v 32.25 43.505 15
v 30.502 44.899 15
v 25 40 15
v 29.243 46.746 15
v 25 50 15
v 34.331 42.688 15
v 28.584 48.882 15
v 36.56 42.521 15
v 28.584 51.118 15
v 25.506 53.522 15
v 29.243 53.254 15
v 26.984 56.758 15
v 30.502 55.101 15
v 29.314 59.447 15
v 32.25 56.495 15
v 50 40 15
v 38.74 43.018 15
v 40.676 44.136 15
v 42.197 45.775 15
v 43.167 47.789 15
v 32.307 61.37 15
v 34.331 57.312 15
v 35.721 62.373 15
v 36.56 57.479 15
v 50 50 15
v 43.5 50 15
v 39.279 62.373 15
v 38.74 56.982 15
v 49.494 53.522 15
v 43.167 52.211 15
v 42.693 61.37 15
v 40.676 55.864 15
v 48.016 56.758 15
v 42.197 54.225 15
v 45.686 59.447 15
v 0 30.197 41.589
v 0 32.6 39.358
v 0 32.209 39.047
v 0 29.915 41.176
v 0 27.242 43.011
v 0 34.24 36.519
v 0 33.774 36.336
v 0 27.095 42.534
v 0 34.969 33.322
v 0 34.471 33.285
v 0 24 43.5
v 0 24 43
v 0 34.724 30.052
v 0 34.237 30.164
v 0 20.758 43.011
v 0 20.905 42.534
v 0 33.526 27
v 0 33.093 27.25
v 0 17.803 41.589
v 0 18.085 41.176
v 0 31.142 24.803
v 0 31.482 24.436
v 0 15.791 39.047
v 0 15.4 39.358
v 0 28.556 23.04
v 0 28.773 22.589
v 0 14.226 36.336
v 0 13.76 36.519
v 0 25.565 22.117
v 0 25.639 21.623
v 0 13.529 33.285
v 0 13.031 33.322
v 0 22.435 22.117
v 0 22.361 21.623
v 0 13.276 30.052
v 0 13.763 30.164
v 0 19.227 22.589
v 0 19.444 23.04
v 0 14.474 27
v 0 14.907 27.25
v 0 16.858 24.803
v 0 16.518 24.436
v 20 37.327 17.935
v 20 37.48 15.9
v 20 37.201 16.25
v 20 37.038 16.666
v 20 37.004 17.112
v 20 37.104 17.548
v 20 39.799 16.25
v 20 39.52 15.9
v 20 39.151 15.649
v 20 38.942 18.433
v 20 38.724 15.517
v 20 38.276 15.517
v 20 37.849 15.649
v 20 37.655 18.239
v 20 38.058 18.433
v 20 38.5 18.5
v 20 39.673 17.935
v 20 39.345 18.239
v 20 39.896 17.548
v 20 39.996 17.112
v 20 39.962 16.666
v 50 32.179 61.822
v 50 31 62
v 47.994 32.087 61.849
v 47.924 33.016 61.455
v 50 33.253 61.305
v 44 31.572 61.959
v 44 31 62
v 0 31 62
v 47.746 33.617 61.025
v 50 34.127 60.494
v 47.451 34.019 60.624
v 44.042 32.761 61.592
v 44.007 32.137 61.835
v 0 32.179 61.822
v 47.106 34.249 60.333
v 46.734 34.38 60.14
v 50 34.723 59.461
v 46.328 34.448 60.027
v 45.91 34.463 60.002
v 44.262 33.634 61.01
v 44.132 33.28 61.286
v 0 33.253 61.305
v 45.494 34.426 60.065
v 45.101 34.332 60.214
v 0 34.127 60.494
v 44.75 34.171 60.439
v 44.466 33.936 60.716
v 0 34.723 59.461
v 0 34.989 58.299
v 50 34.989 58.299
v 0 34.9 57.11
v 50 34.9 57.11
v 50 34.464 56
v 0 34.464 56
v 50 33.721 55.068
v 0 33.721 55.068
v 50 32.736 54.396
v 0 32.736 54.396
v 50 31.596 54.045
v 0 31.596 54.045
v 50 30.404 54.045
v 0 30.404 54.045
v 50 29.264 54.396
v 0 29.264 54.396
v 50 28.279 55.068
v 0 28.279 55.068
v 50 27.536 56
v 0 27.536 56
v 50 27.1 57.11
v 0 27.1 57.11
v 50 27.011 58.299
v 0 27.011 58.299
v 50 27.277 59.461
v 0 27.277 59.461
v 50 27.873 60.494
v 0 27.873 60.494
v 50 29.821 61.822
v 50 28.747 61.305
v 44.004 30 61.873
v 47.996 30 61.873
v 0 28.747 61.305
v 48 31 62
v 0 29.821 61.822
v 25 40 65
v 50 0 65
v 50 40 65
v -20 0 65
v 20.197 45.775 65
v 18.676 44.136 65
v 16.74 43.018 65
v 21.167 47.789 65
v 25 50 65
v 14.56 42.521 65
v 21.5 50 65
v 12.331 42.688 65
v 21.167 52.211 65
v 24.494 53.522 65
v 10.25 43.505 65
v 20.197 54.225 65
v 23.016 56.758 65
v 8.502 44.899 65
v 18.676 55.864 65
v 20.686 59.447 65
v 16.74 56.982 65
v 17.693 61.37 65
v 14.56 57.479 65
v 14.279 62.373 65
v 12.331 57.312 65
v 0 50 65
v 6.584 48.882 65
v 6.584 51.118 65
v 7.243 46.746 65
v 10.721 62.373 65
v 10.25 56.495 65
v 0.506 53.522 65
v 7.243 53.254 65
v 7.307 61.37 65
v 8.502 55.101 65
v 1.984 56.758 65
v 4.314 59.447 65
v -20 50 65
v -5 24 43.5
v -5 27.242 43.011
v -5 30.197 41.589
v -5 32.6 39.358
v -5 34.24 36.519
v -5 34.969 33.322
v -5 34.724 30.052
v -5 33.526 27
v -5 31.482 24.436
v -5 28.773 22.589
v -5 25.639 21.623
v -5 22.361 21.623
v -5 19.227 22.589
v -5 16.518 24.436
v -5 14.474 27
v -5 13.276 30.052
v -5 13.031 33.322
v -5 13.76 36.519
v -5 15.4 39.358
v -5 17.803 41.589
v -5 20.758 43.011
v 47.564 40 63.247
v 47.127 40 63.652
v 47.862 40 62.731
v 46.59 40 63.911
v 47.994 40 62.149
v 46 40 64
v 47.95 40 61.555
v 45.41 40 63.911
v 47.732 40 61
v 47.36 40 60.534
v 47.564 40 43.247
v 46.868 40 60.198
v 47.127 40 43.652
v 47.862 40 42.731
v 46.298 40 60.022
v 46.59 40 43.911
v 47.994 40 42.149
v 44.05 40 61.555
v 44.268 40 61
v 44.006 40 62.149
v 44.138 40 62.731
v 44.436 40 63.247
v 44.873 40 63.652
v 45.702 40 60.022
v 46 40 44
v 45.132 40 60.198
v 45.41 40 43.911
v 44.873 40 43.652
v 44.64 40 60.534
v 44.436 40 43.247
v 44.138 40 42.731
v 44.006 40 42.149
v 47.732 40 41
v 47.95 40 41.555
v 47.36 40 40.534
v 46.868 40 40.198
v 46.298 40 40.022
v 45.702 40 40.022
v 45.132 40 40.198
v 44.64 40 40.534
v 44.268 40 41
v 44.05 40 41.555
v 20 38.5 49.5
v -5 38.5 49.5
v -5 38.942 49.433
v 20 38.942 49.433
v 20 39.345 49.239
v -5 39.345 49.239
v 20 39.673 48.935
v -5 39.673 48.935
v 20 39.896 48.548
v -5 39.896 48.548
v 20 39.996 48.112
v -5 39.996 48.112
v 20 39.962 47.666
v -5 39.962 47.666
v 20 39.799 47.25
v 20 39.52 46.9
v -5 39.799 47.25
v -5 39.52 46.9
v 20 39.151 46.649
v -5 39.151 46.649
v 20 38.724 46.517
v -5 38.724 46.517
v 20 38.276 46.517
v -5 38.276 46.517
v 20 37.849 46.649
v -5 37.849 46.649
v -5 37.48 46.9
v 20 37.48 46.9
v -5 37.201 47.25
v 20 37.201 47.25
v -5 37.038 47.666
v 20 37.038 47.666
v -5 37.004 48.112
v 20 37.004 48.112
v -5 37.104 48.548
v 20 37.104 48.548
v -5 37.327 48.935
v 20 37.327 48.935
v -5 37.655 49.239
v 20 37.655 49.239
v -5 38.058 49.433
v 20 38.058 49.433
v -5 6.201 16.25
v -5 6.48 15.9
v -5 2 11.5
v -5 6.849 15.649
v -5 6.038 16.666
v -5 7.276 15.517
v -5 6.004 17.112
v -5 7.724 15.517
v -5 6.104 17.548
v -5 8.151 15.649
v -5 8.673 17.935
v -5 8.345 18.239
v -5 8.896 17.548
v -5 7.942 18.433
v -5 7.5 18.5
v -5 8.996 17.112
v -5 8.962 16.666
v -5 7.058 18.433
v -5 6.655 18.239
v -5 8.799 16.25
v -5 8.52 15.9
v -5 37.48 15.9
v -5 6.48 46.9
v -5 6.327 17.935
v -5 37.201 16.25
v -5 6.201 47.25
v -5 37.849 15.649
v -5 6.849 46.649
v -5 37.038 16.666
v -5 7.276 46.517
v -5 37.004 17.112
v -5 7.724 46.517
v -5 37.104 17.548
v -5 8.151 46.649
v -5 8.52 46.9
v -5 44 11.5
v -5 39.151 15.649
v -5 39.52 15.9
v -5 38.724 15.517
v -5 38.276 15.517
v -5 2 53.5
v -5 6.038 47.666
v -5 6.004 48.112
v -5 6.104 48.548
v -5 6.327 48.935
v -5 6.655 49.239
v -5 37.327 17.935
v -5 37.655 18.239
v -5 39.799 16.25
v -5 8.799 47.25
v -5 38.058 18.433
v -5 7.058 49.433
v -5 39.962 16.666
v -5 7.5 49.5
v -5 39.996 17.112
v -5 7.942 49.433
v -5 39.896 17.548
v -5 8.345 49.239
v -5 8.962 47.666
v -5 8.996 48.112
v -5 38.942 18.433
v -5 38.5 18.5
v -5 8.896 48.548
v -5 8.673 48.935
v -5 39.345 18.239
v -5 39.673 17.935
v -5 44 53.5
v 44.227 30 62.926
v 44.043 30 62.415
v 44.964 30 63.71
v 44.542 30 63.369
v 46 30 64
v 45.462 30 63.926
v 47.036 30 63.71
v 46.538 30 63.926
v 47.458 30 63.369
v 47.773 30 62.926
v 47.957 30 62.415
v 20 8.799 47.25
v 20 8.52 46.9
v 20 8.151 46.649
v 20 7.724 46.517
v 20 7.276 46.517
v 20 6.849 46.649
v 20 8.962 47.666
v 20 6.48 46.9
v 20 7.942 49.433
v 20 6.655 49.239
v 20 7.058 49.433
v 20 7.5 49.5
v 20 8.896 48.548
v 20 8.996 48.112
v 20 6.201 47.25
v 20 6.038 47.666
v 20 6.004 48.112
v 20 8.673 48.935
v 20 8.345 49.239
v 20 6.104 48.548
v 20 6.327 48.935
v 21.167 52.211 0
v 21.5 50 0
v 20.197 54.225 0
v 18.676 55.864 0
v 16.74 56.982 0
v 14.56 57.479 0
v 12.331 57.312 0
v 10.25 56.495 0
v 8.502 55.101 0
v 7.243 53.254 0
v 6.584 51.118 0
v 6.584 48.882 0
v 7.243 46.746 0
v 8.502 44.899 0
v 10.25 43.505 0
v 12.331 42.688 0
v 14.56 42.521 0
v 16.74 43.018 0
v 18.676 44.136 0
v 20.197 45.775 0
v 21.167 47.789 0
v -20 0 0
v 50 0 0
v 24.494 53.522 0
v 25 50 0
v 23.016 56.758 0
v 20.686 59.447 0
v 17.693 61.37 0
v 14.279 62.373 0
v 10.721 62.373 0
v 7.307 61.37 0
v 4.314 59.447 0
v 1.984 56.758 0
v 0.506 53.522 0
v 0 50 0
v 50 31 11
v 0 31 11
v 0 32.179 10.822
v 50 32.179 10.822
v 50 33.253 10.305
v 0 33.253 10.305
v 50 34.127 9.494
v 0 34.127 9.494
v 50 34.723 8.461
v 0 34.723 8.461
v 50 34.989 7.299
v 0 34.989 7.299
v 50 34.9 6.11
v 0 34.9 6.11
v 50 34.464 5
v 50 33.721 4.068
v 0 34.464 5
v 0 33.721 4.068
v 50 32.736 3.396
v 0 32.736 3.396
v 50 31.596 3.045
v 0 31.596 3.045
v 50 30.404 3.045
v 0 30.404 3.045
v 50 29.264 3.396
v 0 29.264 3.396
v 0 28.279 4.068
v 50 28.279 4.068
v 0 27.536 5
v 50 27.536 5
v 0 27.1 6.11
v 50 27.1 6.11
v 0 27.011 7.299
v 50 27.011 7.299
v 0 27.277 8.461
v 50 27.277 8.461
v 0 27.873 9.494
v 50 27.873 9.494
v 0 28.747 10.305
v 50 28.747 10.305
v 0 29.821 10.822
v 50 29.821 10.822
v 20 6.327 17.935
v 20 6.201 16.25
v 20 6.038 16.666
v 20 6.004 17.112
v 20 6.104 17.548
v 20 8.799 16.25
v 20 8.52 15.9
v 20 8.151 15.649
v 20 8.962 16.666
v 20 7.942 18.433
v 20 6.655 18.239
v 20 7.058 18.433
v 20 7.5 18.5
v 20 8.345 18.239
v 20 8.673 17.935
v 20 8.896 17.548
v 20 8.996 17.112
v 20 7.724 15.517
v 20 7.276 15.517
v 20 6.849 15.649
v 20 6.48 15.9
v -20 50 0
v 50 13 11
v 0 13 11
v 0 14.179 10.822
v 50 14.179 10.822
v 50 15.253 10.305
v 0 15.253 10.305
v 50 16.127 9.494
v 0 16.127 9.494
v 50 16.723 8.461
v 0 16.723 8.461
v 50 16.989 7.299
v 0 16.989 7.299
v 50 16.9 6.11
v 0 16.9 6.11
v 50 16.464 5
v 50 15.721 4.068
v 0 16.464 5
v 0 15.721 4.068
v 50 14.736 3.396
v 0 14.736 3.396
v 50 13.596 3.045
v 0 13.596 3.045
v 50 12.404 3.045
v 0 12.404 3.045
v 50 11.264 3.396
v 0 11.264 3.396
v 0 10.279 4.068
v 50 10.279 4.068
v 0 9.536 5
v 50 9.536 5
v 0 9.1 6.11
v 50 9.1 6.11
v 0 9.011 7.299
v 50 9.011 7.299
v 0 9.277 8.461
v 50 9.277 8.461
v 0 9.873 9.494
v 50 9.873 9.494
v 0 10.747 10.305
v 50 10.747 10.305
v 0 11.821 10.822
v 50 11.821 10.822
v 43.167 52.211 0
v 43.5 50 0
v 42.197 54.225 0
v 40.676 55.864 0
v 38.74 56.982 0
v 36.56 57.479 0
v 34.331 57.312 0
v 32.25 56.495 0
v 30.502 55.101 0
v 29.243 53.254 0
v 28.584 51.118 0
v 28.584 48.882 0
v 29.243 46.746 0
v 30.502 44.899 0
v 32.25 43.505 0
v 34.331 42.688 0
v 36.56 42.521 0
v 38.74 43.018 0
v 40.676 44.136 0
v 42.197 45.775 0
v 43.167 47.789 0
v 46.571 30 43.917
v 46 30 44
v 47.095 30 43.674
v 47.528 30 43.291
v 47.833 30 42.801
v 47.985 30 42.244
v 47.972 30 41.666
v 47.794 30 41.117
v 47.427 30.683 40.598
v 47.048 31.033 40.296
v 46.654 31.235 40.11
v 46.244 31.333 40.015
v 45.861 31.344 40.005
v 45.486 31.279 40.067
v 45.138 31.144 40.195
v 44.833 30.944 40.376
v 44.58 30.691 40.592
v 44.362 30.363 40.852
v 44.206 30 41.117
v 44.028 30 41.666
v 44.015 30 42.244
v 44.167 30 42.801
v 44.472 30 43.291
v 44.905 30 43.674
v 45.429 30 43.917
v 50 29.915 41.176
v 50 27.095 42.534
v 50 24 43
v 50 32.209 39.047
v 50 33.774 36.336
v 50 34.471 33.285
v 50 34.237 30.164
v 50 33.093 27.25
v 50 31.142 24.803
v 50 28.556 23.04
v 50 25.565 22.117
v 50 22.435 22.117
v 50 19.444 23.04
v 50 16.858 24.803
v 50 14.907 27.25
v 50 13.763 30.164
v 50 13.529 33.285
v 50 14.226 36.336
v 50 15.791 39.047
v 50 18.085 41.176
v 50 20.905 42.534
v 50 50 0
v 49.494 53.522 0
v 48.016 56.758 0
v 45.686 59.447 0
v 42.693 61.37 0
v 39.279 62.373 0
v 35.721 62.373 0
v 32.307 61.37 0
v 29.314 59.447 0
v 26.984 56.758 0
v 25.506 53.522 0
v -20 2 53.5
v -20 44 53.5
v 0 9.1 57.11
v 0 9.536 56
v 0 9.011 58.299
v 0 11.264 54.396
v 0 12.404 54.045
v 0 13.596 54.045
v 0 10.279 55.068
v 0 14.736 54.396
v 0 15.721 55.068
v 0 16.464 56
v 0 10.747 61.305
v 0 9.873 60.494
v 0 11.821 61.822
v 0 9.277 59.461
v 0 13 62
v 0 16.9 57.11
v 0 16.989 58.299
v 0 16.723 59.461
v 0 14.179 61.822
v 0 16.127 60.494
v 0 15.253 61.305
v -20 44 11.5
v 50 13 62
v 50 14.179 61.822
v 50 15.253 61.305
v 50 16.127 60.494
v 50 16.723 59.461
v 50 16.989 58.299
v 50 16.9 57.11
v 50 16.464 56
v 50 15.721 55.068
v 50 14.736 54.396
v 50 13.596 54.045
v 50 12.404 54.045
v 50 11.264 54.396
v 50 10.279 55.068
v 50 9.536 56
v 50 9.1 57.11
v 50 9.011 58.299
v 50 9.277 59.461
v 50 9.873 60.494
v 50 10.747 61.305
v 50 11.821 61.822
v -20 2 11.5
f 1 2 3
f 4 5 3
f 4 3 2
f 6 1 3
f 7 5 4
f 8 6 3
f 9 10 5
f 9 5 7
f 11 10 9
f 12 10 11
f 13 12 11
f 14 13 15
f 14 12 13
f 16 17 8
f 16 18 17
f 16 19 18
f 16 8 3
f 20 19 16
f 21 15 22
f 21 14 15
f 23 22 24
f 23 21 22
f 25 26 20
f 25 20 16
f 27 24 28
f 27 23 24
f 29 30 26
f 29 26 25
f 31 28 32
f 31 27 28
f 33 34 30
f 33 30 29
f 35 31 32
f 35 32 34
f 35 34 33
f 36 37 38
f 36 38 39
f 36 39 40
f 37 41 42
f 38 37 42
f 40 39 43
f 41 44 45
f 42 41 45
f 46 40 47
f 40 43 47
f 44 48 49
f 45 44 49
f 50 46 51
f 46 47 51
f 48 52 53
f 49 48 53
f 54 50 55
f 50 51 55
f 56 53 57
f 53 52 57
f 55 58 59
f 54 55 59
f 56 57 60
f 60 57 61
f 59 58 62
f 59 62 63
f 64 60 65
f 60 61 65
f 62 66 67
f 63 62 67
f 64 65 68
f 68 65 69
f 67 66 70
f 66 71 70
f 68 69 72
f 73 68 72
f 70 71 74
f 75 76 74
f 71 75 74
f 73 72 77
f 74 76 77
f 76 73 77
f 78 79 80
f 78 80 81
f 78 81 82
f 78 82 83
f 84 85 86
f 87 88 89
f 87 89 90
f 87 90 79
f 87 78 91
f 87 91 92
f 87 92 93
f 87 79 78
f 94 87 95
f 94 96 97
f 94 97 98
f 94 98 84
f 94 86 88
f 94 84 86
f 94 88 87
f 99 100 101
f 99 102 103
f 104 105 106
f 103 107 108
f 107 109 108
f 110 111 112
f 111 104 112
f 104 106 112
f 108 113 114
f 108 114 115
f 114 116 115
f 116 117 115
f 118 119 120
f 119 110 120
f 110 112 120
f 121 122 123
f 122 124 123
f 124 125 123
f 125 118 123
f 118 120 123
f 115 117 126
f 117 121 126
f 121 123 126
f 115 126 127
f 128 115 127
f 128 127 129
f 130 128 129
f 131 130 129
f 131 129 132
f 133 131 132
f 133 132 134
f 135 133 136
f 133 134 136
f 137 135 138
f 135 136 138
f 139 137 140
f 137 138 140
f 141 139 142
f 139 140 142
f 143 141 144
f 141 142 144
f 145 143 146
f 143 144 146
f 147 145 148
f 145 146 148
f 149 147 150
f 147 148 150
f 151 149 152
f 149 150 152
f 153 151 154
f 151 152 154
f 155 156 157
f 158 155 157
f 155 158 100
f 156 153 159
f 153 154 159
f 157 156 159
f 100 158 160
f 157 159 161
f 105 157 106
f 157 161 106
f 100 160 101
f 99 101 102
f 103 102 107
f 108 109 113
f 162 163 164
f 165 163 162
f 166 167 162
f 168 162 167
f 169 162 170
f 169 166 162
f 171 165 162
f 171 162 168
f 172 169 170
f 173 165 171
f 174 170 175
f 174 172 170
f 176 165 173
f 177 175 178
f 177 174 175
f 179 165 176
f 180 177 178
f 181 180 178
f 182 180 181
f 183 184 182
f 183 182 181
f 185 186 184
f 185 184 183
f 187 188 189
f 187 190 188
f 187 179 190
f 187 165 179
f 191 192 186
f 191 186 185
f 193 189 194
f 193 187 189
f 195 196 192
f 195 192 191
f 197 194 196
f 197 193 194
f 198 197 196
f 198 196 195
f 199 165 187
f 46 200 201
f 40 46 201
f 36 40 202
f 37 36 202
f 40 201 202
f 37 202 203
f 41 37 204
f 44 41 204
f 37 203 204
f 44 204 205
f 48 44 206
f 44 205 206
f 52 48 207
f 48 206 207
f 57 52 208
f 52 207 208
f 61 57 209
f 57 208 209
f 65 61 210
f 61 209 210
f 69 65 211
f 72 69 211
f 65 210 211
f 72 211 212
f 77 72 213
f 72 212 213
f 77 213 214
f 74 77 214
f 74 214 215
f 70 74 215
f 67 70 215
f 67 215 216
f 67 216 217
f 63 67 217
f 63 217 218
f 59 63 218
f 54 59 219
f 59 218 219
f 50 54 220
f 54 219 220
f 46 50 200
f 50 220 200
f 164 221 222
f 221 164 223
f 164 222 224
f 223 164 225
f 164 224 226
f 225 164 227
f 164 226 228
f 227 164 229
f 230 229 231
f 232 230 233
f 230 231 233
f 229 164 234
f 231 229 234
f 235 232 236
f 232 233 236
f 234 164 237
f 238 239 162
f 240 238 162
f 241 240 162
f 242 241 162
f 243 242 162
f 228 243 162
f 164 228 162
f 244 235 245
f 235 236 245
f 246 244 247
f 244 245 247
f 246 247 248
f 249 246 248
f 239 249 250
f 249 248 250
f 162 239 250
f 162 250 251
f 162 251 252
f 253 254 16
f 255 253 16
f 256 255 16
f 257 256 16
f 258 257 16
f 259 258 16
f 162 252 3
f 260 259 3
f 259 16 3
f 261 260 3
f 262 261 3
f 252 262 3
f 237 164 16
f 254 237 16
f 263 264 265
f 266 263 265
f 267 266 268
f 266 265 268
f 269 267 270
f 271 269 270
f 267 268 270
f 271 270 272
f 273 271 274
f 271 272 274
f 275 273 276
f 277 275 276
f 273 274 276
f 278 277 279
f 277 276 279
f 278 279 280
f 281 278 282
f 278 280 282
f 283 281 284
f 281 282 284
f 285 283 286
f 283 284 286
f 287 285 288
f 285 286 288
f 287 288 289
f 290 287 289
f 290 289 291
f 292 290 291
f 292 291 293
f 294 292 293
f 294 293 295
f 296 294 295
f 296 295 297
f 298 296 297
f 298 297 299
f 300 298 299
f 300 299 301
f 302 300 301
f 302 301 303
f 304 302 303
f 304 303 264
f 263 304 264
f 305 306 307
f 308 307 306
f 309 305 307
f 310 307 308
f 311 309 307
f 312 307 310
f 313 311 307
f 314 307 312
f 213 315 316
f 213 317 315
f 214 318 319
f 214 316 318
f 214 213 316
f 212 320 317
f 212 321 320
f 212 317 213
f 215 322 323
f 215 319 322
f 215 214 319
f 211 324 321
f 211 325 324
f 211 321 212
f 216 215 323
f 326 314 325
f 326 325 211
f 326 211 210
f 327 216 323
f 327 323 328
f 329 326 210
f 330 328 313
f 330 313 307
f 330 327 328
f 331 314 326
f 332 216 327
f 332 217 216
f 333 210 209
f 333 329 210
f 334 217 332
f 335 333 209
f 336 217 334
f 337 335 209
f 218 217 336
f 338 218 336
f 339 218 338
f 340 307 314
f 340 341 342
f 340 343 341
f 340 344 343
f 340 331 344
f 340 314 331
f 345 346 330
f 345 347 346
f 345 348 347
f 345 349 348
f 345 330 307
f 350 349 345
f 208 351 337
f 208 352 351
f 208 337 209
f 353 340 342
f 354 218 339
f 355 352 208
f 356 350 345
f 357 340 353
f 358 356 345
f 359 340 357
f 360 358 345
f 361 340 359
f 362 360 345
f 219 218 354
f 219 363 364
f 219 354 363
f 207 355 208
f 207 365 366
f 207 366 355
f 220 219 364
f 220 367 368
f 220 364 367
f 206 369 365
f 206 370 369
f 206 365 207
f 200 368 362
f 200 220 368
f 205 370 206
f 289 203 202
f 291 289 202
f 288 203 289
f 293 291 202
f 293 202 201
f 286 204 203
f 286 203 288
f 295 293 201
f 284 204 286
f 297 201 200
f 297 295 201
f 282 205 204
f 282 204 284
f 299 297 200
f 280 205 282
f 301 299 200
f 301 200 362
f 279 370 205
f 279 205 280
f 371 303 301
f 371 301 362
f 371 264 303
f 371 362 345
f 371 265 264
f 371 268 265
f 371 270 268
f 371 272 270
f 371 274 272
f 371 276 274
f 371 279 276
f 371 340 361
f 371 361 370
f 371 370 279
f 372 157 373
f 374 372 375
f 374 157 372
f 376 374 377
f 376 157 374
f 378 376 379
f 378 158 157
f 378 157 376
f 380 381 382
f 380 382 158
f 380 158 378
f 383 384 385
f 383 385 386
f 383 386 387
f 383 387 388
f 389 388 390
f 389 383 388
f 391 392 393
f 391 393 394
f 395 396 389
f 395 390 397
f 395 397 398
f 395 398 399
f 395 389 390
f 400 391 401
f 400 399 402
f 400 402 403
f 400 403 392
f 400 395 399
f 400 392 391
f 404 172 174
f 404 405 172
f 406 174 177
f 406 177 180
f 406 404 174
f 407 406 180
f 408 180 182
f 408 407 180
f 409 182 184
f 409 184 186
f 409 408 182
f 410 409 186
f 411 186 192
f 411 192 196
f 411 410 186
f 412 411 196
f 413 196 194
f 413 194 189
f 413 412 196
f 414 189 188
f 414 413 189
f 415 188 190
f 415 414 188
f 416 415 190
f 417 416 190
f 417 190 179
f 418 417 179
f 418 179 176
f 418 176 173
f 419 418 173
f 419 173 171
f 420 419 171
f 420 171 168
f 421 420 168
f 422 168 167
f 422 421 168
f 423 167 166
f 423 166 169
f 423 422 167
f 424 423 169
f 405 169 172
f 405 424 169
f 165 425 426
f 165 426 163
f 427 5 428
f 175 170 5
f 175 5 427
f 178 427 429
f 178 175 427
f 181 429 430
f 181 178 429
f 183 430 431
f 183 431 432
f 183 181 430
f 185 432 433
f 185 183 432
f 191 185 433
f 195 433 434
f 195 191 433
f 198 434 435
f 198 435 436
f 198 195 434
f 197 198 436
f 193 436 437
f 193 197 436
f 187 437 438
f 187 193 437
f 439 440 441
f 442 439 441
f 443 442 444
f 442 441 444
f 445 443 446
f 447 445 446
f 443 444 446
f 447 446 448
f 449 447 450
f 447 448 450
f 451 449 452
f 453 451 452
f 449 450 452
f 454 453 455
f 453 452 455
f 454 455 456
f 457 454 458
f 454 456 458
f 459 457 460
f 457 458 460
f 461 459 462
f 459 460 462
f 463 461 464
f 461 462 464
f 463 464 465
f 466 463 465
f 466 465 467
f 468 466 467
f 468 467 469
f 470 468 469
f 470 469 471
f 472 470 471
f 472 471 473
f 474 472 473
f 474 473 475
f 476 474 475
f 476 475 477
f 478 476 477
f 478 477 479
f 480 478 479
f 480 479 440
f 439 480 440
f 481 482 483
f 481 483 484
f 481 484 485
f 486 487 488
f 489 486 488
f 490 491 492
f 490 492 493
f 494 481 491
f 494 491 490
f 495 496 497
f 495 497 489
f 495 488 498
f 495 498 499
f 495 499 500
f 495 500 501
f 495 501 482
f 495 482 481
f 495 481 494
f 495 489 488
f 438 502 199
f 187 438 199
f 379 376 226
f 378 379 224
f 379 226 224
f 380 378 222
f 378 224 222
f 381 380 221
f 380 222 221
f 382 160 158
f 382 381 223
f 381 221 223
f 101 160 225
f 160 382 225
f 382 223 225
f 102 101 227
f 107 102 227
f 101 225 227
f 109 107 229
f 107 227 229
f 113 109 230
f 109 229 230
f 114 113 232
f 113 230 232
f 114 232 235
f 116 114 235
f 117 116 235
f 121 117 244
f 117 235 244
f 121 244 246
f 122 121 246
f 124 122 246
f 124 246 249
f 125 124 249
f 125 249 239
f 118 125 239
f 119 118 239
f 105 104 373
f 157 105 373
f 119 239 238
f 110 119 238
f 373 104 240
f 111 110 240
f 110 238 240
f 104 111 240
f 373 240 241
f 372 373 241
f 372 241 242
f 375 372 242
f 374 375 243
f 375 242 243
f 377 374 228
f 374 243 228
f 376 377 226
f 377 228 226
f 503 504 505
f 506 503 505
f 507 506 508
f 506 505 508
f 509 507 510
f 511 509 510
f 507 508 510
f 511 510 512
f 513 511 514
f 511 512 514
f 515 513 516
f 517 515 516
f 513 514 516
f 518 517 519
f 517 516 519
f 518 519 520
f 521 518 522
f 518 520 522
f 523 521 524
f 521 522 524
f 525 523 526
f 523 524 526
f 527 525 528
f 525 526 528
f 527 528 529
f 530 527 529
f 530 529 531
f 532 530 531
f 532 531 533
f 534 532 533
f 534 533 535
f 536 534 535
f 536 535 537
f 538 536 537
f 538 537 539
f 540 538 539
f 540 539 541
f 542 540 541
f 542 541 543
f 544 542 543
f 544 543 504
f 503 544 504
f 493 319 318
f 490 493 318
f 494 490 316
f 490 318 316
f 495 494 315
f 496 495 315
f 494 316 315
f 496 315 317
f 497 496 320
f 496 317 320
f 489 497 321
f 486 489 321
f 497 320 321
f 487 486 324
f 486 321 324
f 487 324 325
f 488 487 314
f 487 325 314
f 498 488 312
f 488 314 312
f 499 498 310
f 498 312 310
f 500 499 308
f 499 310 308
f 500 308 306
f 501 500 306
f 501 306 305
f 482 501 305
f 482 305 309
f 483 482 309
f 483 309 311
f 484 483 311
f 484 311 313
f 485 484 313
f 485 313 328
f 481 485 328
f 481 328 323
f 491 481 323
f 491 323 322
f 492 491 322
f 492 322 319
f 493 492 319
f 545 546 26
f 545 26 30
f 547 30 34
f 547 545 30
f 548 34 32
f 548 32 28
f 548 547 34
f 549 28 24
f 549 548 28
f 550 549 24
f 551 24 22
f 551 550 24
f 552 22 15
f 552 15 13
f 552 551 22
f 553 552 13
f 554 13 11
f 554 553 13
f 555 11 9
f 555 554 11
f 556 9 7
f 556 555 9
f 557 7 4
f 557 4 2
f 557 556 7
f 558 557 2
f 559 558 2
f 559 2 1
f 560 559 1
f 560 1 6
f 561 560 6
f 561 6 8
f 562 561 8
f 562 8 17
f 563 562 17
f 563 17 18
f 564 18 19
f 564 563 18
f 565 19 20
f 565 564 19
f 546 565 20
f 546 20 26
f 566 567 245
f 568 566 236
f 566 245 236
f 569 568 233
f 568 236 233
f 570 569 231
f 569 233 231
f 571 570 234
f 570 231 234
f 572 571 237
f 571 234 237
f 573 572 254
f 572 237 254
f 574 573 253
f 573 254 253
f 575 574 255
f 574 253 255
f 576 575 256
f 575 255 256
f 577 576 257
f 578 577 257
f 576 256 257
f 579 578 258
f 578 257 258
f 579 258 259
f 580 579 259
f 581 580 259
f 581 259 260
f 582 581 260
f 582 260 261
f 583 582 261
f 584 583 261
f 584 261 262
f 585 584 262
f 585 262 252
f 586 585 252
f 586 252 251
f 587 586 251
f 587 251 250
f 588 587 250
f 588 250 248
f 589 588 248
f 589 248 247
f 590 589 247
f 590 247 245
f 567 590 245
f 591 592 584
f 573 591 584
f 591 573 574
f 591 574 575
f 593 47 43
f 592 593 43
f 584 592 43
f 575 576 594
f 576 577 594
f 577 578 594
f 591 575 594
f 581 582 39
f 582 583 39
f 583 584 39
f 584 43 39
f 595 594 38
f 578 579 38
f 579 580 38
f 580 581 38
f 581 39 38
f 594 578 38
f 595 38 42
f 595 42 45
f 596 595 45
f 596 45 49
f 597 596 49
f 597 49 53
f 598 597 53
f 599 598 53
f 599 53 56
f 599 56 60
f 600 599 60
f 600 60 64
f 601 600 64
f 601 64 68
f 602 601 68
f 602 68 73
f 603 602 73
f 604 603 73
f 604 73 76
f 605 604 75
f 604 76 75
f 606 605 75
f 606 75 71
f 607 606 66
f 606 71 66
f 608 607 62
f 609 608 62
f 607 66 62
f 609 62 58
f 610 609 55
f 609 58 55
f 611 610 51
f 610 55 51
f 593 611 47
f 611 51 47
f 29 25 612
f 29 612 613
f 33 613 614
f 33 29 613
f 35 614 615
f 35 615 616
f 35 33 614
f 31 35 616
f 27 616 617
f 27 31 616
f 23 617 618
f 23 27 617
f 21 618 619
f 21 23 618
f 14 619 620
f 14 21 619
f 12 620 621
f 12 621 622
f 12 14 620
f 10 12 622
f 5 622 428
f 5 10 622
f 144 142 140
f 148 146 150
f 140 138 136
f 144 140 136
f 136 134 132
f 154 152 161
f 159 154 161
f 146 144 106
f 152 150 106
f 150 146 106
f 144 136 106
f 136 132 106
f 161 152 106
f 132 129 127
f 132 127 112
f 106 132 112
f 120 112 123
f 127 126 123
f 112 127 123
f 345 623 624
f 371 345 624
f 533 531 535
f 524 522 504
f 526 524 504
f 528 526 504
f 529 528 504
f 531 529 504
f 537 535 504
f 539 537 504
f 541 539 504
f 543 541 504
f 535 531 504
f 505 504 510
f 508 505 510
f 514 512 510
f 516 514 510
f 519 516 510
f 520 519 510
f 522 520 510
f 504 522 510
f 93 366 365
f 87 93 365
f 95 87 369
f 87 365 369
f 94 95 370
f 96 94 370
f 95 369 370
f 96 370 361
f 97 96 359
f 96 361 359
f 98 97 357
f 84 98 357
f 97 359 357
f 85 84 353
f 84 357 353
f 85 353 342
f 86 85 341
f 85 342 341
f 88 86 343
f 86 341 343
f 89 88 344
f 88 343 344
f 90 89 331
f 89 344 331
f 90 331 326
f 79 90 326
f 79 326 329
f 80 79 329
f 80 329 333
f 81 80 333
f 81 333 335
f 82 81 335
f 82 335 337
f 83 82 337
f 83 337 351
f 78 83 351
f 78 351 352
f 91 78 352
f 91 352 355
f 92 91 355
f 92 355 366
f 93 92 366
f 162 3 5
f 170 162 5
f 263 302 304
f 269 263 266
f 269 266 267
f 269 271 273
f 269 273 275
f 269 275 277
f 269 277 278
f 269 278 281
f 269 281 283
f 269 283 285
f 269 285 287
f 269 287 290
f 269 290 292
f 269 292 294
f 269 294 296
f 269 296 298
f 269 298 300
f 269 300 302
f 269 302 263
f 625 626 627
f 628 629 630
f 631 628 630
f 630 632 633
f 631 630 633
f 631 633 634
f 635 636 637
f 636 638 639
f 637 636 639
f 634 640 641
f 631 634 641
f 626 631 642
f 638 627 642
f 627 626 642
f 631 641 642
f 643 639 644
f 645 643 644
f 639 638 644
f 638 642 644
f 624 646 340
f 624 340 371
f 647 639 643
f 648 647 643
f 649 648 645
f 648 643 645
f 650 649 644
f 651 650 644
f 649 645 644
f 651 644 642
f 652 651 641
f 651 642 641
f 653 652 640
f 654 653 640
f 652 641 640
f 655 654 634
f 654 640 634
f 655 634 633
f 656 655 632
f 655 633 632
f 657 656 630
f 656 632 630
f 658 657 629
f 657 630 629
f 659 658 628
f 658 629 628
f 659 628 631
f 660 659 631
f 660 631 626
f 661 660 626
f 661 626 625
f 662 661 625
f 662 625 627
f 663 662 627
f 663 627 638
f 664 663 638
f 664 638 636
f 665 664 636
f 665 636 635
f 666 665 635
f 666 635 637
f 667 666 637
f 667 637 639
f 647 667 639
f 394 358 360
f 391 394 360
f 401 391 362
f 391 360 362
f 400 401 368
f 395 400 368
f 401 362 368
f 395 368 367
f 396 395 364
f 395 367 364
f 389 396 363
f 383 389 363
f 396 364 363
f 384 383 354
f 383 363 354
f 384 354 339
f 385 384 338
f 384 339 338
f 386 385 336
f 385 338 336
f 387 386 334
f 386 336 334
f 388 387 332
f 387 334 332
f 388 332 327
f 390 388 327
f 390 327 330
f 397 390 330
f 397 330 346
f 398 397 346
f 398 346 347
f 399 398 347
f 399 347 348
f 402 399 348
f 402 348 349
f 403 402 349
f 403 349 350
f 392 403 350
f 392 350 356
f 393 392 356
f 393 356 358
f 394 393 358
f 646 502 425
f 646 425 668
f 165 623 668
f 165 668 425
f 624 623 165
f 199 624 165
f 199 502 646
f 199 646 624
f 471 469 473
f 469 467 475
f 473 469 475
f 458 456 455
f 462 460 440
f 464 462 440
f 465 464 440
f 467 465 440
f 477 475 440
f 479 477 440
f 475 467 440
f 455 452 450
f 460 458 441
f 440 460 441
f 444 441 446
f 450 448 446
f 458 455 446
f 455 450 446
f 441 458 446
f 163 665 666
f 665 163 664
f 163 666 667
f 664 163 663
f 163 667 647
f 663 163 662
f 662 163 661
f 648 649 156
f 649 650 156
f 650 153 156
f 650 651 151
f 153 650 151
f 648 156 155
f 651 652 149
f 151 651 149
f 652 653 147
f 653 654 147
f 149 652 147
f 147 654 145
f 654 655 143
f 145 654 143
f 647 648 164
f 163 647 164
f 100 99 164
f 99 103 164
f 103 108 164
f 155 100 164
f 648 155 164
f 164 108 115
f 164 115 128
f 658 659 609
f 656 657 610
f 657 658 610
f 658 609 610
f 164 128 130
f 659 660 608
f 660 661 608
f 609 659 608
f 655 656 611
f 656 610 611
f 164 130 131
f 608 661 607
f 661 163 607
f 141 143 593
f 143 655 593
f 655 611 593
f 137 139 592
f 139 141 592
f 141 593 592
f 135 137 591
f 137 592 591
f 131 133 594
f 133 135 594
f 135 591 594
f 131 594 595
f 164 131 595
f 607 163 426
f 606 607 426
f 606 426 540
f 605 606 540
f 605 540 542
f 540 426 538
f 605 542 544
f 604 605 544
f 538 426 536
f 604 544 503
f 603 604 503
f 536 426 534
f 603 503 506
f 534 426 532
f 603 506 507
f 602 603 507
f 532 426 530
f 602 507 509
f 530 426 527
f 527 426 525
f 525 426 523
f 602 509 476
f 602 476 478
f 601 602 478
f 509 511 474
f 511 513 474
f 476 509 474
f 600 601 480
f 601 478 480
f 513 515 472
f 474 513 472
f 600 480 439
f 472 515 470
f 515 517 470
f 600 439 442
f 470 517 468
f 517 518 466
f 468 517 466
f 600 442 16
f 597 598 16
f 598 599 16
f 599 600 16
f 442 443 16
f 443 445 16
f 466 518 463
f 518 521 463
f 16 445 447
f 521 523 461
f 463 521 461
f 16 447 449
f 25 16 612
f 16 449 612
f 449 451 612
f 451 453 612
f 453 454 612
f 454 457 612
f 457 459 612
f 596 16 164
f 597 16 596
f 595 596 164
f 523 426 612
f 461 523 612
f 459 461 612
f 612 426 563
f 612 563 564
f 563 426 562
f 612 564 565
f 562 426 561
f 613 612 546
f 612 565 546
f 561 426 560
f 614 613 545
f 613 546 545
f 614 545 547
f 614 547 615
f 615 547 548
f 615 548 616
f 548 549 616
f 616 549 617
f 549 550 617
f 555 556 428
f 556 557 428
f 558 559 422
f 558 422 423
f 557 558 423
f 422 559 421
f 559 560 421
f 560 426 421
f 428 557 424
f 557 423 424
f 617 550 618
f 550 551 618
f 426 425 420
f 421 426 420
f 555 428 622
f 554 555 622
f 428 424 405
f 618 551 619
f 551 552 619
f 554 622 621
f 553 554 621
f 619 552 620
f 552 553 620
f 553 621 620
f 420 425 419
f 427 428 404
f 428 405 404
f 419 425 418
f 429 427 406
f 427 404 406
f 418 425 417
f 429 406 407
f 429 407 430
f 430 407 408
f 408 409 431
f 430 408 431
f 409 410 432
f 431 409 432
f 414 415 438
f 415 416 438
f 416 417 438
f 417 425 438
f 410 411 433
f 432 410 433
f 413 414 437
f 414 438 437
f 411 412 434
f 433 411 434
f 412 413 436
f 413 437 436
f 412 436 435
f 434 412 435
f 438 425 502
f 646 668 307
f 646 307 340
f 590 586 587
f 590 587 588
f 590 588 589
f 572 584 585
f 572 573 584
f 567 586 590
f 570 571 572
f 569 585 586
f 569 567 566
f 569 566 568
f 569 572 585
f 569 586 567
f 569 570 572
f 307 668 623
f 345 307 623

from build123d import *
from build123d.topology import SkipClean

# Parameters (mm, degrees)
SKETCH1_R               = 7.5
BOSS_EXTRUDE1_DEPTH     = 15
SKETCH2_R               = 7.5
BOSS_EXTRUDE2_DEPTH     = 50
SKETCH3_W               = 50
SKETCH3_H               = 40
BOSS_EXTRUDE3_DEPTH     = 65
CUT_EXTRUDE2_DEPTH      = 96.372952141
SKETCH9_R               = 4
SKETCH9_R_2             = 10.5
CUT_EXTRUDE3_DEPTH      = 104.107953137
ESQUISSE1_R             = 2
ENL_V_MAT_EXTRU_1_DEPTH = 10
ESQUISSE3_W             = 65
ESQUISSE3_H             = 50
ESQUISSE3_R             = 1.5
ESQUISSE3_R_2           = 11
BOSS_EXTRU_1_DEPTH      = 5
ESQUISSE3_4_W           = 65
ESQUISSE3_4_H           = 50
ESQUISSE3_4_W_2         = 42
ESQUISSE3_4_H_2         = 42
BOSS_EXTRU_2_DEPTH      = 20
ENL_V_START             = -20
ESQUISSE3_5_R           = 1.5
ENL_V_MAT_EXTRU_4_DEPTH = 20


with BuildPart() as part:
    # Sketch1 → Boss-Extrude1 (new body)
    with BuildSketch(Plane.XY):
        with BuildLine():
            Line((0, 0), (50, 0))
            Line((50, 0), (50, 50))
            ThreePointArc((50, 50), (40.582575695, 63.228756555), (25, 58.660254038))
            ThreePointArc((25, 58.660254038), (9.417424305, 63.228756555), (0, 50))
            Line((0, 50), (0, 0))
        make_face()
        with Locations((36, 50)):
            Circle(SKETCH1_R, mode=Mode.SUBTRACT)
        with Locations((14, 50)):
            Circle(SKETCH1_R, mode=Mode.SUBTRACT)
    extrude(amount=BOSS_EXTRUDE1_DEPTH)

    # Sketch2 → Boss-Extrude2 (add)
    with BuildSketch(Plane.XY.offset(15)):
        with BuildLine():
            Line((0, 50), (0, 0))
            Line((0, 0), (25, 0))
            Line((25, 0), (25, 50))
            ThreePointArc((25, 50), (12.5, 62.5), (0, 50))
        make_face()
        with Locations((14, 50)):
            Circle(SKETCH2_R, mode=Mode.SUBTRACT)
    extrude(amount=BOSS_EXTRUDE2_DEPTH)

    # Sketch3 → Boss-Extrude3 (add)
    with BuildSketch(Plane(origin=(0, 0, 0), x_dir=(-1, 0, 0), z_dir=(0, 0, -1))):
        with Locations((-25, 20)):
            Rectangle(SKETCH3_W, SKETCH3_H)
    extrude(amount=-BOSS_EXTRUDE3_DEPTH)

    # Sketch2<3> → Cut-Extrude2 (cut, through all)
    with BuildSketch(Plane.XY.offset(15)):
        with BuildLine():
            ThreePointArc((25, 58.660254038), (9.417424305, 63.228756555), (0, 50))
            ThreePointArc((0, 50), (12.5, 62.5), (25, 50))
            ThreePointArc((25, 50), (37.5, 62.5), (50, 50))
            ThreePointArc((50, 50), (40.582575695, 63.228756555), (25, 58.660254038))
        make_face()
    extrude(amount=-CUT_EXTRUDE2_DEPTH, mode=Mode.SUBTRACT)

    # Sketch9 → Cut-Extrude3 (cut, through all)
    with BuildSketch(Plane.ZY):
        with Locations((58, 13)):
            Circle(SKETCH9_R)
        with Locations((7, 13)):
            Circle(SKETCH9_R)
        with Locations((7, 31)):
            Circle(SKETCH9_R)
        with Locations((58, 31)):
            Circle(SKETCH9_R)
        with Locations((32.5, 24)):
            Circle(SKETCH9_R_2)
    extrude(amount=-CUT_EXTRUDE3_DEPTH, mode=Mode.SUBTRACT)

    # Esquisse1 → Enlèv. mat.-Extru.1 (cut)
    with SkipClean():  # the faces are left unmerged after this step: merging them gives an invalid solid
        with BuildSketch(Plane(origin=(0, 40, 0), x_dir=(1, 0, 0), z_dir=(0, 1, 0))):
            with Locations((46, -42)):
                Circle(ESQUISSE1_R)
            with Locations((46, -62)):
                Circle(ESQUISSE1_R)
        extrude(amount=-ENL_V_MAT_EXTRU_1_DEPTH, mode=Mode.SUBTRACT)

    # Esquisse3 → Boss.-Extru.1 (add)
    with SkipClean():  # the faces are left unmerged after this step: merging them gives an invalid solid
        with BuildSketch(Plane.ZY):
            with Locations((32.5, 25)):
                Rectangle(ESQUISSE3_W, ESQUISSE3_H)
            with Locations((17, 7.5)):
                Circle(ESQUISSE3_R, mode=Mode.SUBTRACT)
            with Locations((48, 7.5)):
                Circle(ESQUISSE3_R, mode=Mode.SUBTRACT)
            with Locations((32.5, 24)):
                Circle(ESQUISSE3_R_2, mode=Mode.SUBTRACT)
            with Locations((17, 38.5)):
                Circle(ESQUISSE3_R, mode=Mode.SUBTRACT)
            with Locations((48, 38.5)):
                Circle(ESQUISSE3_R, mode=Mode.SUBTRACT)
        extrude(amount=BOSS_EXTRU_1_DEPTH)

    # Esquisse3<4> → Boss.-Extru.2 (add)
    with SkipClean():  # the faces are left unmerged after this step: merging them gives an invalid solid
        with BuildSketch(Plane.ZY):
            with Locations((32.5, 25)):
                Rectangle(ESQUISSE3_4_W, ESQUISSE3_4_H)
            with Locations((32.5, 23)):
                Rectangle(ESQUISSE3_4_W_2, ESQUISSE3_4_H_2, mode=Mode.SUBTRACT)
        extrude(amount=BOSS_EXTRU_2_DEPTH)

    # Esquisse3<5> → Enlèv. mat.-Extru.4 (cut)
    with SkipClean():  # the faces are left unmerged after this step: merging them gives an invalid solid
        with BuildSketch(Plane.ZY.offset(ENL_V_START)):
            with Locations((17, 38.5)):
                Circle(ESQUISSE3_5_R)
            with Locations((48, 38.5)):
                Circle(ESQUISSE3_5_R)
            with Locations((48, 7.5)):
                Circle(ESQUISSE3_5_R)
            with Locations((17, 7.5)):
                Circle(ESQUISSE3_5_R)
        extrude(amount=ENL_V_MAT_EXTRU_4_DEPTH, mode=Mode.SUBTRACT)


solid = part.part
